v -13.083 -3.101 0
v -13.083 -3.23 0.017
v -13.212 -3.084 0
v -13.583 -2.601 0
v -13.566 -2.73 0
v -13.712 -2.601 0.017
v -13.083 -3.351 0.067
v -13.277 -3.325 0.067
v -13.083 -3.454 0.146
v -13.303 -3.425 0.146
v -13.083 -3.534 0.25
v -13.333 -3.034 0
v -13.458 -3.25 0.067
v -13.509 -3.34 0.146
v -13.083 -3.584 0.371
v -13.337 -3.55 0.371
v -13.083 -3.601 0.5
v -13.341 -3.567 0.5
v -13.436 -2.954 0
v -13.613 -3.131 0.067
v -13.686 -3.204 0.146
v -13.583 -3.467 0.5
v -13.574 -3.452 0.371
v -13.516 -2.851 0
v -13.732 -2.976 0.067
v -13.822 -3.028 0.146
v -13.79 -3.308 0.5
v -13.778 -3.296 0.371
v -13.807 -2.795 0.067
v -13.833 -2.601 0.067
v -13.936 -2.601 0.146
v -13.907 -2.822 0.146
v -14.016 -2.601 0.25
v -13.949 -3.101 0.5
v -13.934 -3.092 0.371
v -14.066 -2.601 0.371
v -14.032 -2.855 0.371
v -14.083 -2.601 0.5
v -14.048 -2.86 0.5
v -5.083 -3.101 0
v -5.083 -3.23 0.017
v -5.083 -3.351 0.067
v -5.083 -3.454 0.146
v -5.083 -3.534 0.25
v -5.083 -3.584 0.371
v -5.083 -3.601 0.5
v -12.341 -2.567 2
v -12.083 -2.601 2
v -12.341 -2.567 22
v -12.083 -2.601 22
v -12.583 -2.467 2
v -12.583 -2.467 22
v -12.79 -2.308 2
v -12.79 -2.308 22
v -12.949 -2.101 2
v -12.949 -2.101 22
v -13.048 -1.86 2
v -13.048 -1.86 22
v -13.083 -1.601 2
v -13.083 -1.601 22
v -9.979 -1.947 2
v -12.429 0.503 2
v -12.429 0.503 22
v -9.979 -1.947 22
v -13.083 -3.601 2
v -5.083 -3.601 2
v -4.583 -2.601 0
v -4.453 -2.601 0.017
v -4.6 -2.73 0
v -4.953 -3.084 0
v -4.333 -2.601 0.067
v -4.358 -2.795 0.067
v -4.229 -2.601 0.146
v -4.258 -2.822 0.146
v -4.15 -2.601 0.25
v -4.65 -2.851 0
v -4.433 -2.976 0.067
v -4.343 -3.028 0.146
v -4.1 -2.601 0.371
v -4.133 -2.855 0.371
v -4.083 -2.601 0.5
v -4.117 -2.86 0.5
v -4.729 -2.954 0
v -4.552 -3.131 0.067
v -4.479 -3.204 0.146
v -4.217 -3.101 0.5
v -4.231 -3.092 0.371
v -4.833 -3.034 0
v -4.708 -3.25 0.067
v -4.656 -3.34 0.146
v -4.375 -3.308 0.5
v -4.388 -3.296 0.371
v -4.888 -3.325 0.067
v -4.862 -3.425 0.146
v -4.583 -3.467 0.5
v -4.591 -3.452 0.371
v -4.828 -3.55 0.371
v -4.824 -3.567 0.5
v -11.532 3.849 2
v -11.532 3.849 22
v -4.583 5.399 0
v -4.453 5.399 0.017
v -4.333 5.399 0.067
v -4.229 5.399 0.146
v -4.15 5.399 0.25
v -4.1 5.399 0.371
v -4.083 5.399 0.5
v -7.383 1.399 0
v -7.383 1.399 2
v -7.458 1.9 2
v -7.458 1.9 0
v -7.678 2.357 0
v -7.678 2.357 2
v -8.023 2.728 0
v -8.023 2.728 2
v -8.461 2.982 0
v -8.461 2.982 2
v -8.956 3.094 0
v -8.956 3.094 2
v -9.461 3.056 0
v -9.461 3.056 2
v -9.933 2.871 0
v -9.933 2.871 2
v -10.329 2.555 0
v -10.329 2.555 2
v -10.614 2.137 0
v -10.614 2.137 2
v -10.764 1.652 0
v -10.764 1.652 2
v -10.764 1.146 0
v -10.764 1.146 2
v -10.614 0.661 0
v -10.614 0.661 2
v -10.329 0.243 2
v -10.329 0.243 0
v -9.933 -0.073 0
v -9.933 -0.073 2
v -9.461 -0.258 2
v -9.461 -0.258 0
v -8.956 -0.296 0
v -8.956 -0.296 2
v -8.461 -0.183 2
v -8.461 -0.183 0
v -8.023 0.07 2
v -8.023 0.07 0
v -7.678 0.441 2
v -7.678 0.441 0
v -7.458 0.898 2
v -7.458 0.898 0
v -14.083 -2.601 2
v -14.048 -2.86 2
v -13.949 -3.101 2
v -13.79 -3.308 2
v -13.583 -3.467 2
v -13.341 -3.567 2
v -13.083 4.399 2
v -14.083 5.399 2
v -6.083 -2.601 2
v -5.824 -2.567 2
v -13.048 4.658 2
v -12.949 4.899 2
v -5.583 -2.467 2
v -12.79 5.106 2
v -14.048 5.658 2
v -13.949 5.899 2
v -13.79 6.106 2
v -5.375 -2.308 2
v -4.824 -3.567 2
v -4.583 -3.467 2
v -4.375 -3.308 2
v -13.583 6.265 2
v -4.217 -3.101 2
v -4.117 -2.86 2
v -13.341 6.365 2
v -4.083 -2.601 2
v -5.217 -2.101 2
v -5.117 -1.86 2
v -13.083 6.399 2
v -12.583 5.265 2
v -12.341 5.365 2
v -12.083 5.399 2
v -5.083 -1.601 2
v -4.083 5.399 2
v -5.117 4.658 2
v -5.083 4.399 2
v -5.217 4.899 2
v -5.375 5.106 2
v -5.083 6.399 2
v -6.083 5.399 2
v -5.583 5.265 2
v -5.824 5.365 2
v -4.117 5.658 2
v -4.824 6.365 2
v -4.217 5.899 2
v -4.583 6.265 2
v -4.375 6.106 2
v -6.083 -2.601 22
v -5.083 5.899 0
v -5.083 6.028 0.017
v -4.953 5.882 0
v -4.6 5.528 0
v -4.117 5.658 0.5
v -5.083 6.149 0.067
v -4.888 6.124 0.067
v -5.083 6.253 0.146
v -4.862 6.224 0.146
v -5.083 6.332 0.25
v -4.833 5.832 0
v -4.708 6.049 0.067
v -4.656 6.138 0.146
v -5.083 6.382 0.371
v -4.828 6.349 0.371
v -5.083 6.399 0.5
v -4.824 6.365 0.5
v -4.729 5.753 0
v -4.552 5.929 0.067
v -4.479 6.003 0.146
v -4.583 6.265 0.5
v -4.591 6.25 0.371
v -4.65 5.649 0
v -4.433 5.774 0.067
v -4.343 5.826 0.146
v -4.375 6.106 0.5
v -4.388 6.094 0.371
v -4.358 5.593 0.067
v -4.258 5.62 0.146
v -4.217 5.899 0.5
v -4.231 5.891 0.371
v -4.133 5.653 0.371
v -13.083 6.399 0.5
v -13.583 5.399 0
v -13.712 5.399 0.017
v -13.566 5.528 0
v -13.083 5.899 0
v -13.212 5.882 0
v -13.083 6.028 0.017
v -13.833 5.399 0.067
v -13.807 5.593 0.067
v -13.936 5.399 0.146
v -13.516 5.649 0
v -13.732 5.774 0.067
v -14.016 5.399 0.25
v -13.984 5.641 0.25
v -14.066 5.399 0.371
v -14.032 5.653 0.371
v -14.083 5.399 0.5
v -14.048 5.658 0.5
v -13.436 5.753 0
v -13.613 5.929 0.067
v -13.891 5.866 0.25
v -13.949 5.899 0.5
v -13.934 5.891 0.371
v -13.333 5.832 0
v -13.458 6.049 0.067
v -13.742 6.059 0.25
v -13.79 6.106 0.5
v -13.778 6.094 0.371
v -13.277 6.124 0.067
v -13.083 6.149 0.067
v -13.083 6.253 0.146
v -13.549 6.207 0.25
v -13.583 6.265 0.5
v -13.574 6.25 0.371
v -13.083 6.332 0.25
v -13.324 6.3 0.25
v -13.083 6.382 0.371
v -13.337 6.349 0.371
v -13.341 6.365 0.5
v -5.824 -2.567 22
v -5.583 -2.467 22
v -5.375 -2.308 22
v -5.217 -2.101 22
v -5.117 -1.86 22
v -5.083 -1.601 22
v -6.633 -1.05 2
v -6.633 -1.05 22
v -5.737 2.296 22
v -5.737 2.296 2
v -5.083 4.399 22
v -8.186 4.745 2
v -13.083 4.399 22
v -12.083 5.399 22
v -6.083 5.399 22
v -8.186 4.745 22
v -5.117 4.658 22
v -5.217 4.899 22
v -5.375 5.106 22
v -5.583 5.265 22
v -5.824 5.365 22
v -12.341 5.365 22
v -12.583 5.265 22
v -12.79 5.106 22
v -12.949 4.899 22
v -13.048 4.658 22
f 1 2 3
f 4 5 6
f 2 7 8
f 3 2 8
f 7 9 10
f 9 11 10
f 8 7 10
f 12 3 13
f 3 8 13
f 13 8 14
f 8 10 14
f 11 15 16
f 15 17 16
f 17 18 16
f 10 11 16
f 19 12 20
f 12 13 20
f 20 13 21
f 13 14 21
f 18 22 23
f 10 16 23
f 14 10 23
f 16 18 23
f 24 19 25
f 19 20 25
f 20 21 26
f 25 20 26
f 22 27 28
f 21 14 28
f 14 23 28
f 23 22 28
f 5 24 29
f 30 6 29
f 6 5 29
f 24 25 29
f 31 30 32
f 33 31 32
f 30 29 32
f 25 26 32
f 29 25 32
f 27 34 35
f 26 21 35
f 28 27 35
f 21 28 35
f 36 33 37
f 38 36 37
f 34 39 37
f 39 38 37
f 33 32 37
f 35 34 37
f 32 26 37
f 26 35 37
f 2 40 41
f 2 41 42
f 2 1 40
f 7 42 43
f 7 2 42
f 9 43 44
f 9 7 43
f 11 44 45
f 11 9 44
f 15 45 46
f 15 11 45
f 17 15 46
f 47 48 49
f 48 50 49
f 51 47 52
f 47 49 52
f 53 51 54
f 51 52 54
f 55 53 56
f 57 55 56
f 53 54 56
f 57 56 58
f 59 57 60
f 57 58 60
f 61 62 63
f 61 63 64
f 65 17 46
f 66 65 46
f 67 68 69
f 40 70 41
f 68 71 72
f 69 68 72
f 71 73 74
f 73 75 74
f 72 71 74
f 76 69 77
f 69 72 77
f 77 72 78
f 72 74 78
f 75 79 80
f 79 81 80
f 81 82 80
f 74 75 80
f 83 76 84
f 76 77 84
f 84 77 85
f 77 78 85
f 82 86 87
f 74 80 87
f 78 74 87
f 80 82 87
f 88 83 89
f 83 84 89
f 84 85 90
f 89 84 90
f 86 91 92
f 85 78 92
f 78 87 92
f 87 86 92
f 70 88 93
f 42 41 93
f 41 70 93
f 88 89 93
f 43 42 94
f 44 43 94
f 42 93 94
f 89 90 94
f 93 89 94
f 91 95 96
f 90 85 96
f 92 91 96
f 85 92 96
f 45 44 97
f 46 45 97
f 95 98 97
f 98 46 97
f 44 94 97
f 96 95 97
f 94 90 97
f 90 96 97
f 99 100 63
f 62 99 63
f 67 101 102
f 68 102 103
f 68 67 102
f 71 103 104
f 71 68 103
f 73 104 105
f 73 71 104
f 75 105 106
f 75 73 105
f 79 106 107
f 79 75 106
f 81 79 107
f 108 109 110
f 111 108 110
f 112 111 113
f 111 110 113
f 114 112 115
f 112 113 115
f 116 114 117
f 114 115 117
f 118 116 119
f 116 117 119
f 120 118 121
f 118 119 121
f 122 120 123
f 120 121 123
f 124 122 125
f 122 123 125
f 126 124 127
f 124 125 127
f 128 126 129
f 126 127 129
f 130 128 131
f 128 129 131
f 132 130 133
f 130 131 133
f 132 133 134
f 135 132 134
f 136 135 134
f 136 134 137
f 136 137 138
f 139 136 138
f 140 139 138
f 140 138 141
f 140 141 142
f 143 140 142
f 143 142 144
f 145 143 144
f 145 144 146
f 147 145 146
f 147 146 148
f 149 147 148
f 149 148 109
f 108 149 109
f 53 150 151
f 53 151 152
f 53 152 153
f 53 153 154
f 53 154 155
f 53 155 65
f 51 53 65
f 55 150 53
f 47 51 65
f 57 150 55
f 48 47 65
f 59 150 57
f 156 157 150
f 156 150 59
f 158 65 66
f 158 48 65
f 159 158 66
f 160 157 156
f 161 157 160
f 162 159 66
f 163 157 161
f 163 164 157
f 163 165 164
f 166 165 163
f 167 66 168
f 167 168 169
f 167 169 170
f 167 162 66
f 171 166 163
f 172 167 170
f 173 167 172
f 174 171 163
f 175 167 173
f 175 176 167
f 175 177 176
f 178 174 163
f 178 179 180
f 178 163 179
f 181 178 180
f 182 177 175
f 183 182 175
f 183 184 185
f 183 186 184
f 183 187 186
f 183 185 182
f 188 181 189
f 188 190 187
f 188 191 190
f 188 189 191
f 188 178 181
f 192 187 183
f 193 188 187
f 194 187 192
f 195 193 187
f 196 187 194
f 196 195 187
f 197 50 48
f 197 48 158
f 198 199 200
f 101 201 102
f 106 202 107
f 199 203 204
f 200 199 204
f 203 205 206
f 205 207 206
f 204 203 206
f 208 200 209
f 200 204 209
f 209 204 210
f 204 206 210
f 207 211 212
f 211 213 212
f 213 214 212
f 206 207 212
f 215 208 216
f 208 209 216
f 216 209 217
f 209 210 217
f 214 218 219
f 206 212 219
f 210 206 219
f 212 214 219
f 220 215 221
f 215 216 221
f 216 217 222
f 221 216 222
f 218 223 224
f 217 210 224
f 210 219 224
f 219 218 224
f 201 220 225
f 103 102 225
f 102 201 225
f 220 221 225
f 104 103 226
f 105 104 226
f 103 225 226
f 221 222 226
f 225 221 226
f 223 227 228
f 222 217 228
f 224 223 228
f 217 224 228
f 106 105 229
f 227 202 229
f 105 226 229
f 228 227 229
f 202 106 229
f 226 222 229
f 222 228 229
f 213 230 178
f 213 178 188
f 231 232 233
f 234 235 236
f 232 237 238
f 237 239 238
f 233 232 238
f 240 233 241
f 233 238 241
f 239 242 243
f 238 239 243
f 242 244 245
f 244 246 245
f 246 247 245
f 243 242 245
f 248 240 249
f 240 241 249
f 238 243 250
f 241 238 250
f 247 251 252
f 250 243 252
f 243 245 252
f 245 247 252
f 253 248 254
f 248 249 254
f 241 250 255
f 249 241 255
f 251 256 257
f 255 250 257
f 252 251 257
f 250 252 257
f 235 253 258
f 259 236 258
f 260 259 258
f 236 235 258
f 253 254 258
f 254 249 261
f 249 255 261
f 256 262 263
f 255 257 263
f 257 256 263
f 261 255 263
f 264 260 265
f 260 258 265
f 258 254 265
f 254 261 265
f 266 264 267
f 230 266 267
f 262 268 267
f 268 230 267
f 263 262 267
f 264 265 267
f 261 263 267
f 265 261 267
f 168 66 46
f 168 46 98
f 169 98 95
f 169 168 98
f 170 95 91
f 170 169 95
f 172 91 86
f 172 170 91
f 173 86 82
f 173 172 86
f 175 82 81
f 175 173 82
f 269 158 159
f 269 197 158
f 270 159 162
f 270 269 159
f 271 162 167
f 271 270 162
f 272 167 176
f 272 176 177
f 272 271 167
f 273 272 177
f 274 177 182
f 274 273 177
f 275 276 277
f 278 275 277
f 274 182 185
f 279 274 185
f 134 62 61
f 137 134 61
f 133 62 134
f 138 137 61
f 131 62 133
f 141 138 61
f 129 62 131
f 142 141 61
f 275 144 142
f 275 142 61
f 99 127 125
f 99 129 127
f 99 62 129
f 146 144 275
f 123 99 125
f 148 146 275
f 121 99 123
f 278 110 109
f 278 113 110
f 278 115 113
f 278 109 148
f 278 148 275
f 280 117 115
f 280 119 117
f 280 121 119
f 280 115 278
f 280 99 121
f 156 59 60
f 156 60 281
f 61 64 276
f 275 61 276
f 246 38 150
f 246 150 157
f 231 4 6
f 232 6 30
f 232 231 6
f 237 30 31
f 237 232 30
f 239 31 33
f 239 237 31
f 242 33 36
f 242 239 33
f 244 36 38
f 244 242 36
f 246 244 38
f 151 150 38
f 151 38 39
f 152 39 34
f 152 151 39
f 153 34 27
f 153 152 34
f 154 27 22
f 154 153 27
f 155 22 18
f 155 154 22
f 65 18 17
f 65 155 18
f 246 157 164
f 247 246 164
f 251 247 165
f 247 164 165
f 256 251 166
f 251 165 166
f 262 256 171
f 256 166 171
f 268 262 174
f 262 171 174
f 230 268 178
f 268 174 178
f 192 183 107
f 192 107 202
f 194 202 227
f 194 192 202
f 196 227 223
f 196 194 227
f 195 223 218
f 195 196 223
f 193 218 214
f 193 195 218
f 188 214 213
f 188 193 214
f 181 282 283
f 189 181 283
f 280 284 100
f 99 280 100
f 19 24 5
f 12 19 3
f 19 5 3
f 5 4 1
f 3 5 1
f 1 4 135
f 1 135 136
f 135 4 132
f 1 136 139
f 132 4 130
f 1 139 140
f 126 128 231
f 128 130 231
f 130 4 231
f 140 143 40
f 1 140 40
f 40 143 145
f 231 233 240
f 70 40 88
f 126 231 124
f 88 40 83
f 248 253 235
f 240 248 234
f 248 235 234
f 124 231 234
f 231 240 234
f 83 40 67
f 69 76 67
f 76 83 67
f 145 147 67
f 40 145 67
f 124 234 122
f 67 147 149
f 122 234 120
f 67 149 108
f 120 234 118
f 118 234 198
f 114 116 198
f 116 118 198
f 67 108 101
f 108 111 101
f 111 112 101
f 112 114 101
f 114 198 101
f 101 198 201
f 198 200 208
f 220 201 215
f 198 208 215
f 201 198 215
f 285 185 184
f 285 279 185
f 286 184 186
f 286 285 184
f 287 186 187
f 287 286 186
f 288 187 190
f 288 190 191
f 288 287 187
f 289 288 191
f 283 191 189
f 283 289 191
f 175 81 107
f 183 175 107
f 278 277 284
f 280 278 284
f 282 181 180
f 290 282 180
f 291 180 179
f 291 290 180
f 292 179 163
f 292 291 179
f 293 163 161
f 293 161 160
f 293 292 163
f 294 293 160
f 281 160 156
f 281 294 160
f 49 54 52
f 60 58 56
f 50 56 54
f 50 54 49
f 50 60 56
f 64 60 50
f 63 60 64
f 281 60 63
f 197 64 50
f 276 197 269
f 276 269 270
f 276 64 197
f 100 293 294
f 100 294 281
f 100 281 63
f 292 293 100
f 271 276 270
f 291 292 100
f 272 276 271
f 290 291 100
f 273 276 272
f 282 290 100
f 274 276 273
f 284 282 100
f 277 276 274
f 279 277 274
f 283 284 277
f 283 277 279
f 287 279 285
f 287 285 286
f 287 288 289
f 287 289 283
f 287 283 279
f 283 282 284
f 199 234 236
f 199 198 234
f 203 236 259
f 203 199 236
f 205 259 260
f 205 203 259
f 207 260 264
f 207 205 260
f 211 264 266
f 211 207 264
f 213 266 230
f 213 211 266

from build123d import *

# Parameters (mm, degrees)
SKETCH1_W            = 10
SKETCH1_H            = 10
BOSS_EXTRUDE1_DEPTH  = 2
FILLET2_R            = 1
FILLET3_R            = 1
FILLET5_R            = 0.5
SKETCH6_W            = 8
SKETCH6_H            = 8
BOSS_EXTRUDE2_DEPTH  = 20
FILLET7_R            = 1
M3_CLEARANCE_HOLE1_D = 3.4
CUT_EXTRUDE1_DEPTH   = 20


with BuildPart() as part:
    # Sketch1 → Boss-Extrude1 (new body)
    with BuildSketch(Plane.XY):
        with Locations((-9.082568807, 1.399082569)):
            Rectangle(SKETCH1_W, SKETCH1_H)
    extrude(amount=BOSS_EXTRUDE1_DEPTH)

    # Fillet2
    fillet2_edges = [part.edges().sort_by_distance(p)[0] for p in [
        (-14.082568807, 6.399082569, 1),
        (-4.082568807, 6.399082569, 1),
        (-14.082568807, -3.600917431, 1),
    ]]
    fillet(fillet2_edges, radius=FILLET2_R)

    # Fillet3
    fillet3_edges = [part.edges().sort_by_distance(p)[0] for p in [
        (-4.082568807, -3.600917431, 1),
    ]]
    fillet(fillet3_edges, radius=FILLET3_R)

    # Fillet5
    fillet5_edges = [part.edges().sort_by_distance(p)[0] for p in [
        (-9.082568807, 6.399082569, 0),
        (-14.082568807, 1.399082569, 0),
        (-9.082568807, -3.600917431, 0),
        (-13.789675589, -3.308024212, 0),
        (-13.789675589, 6.10618935, 0),
        (-4.375462026, 6.10618935, 0),
        (-4.082568807, 1.399082569, 0),
        (-4.375462026, -3.308024212, 0),
    ]]
    fillet(fillet5_edges, radius=FILLET5_R)

    # Sketch6 → Boss-Extrude2 (add)
    with BuildSketch(Plane.XY.offset(2)):
        with Locations((-9.082568807, 1.399082569)):
            Rectangle(SKETCH6_W, SKETCH6_H)
    extrude(amount=BOSS_EXTRUDE2_DEPTH)

    # Fillet7
    fillet7_edges = [part.edges().sort_by_distance(p)[0] for p in [
        (-13.082568807, 5.399082569, 12),
        (-13.082568807, -2.600917431, 12),
        (-5.082568807, -2.600917431, 12),
        (-5.082568807, 5.399082569, 12),
    ]]
    fillet(fillet7_edges, radius=FILLET7_R)

    # M3 Clearance Hole1 (through all)
    with Locations(Plane(origin=(0, 0, 0), x_dir=(-1, 0, 0), z_dir=(0, 0, -1))):
        with Locations((9.082568807, 1.399082569)):
            Hole(M3_CLEARANCE_HOLE1_D / 2)

    # Sketch7 → Cut-Extrude1 (cut)
    with BuildSketch(Plane.XY.offset(22)):
        Polygon((-6.633079065, -1.050407174), (-5.736503592, 2.295658041), (-8.185993335, 4.745147784), (-11.53205855, 3.848572312), (-12.428634022, 0.502507097), (-9.97914428, -1.946982646), align=None)
    extrude(amount=-CUT_EXTRUDE1_DEPTH, mode=Mode.SUBTRACT)


solid = part.part
